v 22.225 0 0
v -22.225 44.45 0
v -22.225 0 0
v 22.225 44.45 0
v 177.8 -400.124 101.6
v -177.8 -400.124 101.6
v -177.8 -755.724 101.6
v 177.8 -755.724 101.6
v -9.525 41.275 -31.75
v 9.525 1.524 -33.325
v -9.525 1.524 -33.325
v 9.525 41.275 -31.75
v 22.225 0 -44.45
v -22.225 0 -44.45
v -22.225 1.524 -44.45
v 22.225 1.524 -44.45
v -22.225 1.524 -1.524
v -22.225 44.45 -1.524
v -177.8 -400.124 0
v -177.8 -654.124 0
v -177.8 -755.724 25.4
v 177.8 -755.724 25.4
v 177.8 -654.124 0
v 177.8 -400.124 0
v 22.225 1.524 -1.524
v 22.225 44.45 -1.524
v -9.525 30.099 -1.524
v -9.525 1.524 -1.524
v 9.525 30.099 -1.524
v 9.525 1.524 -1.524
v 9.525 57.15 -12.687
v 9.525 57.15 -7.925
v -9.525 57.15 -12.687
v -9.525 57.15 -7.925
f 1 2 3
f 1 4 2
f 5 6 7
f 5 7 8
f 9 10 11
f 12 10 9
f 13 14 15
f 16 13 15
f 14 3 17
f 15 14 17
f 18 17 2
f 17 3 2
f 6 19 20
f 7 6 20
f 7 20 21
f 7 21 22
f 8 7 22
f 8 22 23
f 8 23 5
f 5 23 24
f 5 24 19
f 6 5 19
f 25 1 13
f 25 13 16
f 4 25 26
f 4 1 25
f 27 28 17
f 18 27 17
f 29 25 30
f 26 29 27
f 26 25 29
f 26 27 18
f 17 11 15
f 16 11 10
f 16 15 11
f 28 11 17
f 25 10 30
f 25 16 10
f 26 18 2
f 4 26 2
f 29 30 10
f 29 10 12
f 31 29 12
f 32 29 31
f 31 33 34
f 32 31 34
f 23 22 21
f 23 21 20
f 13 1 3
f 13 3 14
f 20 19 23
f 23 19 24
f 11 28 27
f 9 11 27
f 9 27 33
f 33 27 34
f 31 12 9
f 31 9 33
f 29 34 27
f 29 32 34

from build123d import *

# Parameters (mm, degrees)
F1_DEPTH = 22.225
F3_DEPTH = 9.525
F5_DEPTH = 101.6
F7_DEPTH = 355.6


with BuildPart() as f1:
    # F0 (on Right) → F1 (new body, symmetric)
    with BuildSketch(Plane.YZ):
        Polygon((44.45, 0), (0, 0), (0, -44.45), (1.524, -44.45), (1.524, -1.524), (44.45, -1.524), align=None)
    extrude(amount=F1_DEPTH, both=True)

    # F2 (on Right) → F3 (join, symmetric)
    with BuildSketch(Plane.YZ):
        Polygon((30.099, -1.524), (1.524, -1.524), (1.524, -33.3248), (41.275, -31.75), (57.15, -12.6873), (57.15, -7.9248), align=None)
    extrude(amount=F3_DEPTH, both=True)


with BuildPart() as f5:
    # F4 (on Top) → F5 (new body)
    with BuildSketch(Plane.XY):
        Polygon((177.8, -755.723699), (177.8, -400.123699), (0, -400.123699), (-177.8, -400.123699), (-177.8, -755.723699), align=None)
    extrude(amount=F5_DEPTH)

    # F6 (on face) → F7 (cut, through all)
    with BuildSketch(Plane(origin=(-177.8, 0, 0), x_dir=(0, -1, 0), z_dir=(-1, 0, 0))):
        Polygon((755.723699, 0), (755.723699, 25.4), (654.123699, 0), align=None)
    extrude(amount=-F7_DEPTH, mode=Mode.SUBTRACT)


solid = Compound([f1.part, f5.part])
